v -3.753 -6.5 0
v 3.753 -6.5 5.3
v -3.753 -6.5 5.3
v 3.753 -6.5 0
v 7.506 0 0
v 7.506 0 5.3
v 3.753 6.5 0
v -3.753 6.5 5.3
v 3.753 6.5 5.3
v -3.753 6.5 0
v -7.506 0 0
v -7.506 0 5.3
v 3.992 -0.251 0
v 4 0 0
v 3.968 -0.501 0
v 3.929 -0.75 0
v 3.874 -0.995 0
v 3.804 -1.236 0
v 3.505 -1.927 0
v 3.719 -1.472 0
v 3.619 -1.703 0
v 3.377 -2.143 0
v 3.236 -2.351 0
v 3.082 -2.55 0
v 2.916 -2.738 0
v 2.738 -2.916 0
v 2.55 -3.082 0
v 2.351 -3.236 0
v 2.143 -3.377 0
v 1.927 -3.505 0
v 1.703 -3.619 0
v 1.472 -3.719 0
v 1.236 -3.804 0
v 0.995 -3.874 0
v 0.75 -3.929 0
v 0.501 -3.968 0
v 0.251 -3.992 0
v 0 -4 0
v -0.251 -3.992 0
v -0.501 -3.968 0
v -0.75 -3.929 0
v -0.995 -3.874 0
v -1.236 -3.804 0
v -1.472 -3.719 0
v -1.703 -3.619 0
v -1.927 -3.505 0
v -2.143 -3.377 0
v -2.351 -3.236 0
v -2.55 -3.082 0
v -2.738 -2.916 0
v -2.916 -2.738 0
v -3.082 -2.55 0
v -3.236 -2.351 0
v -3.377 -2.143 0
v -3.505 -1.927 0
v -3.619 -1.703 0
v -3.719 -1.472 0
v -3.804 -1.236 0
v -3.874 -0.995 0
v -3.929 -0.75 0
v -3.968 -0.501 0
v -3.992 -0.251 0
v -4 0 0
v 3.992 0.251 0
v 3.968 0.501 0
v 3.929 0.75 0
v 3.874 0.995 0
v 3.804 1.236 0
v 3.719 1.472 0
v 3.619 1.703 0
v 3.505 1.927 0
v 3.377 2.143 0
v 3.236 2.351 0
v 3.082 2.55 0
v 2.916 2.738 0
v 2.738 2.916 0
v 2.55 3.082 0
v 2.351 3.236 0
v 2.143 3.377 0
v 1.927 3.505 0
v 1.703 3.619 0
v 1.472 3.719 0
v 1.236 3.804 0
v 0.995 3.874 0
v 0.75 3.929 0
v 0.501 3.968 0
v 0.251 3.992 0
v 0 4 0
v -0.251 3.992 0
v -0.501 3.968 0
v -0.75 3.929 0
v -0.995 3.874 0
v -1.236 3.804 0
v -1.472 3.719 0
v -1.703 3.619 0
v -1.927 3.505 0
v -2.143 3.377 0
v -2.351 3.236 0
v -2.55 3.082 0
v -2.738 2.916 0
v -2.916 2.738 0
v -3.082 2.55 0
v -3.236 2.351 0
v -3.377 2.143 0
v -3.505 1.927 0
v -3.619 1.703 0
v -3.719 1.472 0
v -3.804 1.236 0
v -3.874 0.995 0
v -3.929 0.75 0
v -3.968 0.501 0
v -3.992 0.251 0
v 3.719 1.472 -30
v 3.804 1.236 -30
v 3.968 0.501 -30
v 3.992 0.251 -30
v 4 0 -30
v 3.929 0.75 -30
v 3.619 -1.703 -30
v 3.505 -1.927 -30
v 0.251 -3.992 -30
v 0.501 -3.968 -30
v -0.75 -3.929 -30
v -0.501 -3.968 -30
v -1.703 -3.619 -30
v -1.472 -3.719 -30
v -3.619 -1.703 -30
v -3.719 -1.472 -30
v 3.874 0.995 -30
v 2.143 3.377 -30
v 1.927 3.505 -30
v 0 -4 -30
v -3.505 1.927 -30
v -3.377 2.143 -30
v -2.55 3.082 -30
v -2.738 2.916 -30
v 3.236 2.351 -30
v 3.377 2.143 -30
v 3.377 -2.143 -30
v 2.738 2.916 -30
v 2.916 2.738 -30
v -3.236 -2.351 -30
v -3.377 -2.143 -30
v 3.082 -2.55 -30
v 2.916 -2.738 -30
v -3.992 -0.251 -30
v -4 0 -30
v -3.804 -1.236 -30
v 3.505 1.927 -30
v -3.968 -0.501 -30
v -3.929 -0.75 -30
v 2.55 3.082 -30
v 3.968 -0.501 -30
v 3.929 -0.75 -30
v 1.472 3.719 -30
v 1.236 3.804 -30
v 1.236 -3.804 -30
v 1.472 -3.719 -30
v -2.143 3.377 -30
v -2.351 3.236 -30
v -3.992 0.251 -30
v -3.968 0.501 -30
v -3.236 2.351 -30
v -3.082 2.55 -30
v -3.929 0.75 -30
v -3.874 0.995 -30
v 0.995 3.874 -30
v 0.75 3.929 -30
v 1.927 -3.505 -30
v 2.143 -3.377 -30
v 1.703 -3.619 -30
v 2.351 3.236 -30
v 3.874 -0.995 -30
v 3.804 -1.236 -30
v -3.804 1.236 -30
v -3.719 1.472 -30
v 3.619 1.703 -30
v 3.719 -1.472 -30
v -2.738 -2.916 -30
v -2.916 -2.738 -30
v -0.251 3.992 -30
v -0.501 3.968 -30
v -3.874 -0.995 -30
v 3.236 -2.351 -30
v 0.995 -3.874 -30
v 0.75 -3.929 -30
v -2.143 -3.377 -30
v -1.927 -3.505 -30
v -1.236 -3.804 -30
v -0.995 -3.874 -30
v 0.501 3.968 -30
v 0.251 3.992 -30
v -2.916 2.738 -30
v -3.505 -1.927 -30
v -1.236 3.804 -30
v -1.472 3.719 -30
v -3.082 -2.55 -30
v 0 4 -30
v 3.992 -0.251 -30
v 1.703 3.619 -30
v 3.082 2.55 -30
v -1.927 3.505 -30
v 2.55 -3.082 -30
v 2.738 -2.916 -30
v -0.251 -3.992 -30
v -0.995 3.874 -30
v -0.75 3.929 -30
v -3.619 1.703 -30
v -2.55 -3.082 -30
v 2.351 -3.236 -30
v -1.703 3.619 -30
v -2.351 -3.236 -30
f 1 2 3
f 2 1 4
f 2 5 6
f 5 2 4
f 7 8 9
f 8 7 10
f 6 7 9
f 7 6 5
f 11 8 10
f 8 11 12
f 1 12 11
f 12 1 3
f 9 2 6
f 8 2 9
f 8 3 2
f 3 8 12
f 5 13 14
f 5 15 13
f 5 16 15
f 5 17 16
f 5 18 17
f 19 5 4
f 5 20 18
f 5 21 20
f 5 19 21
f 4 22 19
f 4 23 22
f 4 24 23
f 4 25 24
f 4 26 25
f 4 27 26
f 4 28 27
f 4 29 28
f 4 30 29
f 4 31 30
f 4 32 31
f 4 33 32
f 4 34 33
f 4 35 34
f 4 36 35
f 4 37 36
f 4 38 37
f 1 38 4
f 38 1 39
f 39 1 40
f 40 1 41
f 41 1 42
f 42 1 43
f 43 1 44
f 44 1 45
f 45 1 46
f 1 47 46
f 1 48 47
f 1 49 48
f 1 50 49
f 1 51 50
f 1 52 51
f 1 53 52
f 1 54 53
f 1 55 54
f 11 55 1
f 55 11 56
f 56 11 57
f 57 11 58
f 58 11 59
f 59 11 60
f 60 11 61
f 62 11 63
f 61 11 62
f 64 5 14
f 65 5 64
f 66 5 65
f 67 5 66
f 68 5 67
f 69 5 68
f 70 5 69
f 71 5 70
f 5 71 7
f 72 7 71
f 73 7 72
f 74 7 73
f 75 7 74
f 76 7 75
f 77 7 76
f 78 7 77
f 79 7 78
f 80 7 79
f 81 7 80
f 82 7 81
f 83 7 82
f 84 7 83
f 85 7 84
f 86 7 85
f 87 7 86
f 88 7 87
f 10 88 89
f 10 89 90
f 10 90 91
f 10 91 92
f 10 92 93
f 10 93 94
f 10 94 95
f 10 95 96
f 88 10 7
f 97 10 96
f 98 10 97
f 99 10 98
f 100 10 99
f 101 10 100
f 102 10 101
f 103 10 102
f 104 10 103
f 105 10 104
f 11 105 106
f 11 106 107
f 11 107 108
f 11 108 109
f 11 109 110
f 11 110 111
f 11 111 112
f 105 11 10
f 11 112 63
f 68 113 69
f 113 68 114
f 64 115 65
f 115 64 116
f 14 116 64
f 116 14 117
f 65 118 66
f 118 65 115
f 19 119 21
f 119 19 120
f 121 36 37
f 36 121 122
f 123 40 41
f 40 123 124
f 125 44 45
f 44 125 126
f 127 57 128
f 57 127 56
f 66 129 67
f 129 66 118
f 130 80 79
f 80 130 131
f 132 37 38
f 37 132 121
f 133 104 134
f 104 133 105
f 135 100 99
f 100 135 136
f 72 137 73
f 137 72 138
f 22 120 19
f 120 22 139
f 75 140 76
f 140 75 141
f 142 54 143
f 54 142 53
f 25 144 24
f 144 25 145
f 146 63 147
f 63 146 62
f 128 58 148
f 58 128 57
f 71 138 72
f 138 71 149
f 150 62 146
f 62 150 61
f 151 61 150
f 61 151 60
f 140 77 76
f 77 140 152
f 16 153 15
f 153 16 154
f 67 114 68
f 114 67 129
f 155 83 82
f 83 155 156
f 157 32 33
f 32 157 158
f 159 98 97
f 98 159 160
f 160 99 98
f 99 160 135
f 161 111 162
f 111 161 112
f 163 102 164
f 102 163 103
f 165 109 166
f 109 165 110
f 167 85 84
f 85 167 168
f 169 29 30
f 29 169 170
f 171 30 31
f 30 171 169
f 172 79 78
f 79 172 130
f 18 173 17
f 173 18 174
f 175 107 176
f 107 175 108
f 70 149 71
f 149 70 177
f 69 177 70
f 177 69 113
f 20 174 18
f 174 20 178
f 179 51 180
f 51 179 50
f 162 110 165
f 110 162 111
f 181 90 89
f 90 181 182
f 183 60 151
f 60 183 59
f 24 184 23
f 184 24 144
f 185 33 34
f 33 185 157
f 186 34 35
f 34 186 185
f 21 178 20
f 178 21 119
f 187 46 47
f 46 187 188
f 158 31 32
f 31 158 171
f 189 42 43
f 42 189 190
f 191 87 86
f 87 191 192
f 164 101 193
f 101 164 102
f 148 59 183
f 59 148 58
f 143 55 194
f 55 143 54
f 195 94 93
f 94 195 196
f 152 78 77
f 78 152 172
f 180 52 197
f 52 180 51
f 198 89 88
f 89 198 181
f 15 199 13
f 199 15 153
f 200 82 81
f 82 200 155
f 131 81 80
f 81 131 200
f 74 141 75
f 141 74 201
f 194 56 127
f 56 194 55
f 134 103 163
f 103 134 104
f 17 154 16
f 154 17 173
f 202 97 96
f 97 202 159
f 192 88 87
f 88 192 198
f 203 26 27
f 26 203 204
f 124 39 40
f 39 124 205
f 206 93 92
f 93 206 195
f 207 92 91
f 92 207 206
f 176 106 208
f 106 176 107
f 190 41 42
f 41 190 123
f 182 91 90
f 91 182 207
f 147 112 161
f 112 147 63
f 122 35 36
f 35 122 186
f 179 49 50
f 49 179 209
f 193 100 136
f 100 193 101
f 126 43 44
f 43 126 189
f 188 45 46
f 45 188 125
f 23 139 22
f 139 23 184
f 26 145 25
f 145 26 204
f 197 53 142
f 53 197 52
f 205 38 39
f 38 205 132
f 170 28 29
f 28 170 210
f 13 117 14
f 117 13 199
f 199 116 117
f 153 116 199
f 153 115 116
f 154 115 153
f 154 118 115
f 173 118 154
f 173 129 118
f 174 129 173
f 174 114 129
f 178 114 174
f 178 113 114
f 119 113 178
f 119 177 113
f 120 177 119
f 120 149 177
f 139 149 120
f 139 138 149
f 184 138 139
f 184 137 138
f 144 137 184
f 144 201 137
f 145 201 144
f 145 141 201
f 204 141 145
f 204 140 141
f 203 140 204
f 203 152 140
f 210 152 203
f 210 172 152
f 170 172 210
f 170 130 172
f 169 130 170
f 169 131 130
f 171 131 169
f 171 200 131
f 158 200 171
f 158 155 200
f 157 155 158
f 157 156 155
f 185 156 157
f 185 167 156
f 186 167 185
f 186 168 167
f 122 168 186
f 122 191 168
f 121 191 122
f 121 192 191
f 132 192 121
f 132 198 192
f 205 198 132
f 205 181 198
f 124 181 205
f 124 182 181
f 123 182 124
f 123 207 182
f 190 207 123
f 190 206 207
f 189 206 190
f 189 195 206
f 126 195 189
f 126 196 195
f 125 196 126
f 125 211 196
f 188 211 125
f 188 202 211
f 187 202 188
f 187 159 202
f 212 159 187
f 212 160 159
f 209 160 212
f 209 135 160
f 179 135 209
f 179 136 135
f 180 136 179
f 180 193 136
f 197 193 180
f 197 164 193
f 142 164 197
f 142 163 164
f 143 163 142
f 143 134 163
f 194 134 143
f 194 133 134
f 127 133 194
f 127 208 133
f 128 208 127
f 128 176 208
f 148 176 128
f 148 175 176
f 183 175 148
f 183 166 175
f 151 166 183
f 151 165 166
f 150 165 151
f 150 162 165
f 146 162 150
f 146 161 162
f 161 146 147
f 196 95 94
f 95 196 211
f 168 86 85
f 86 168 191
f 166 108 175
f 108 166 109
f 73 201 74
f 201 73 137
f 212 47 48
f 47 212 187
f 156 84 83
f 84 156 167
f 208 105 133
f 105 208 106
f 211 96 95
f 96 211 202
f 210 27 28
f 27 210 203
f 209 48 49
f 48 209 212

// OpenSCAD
// M8 hex bolt (ISO 4014 style, simplified: unthreaded cylindrical shank)
// Head: hexagonal prism, across-flats 13 mm, height 5.3 mm
// Shank: diameter 8 mm, length 30 mm
// Axis: +Z. Head bottom face at z = 0, shank extends into z < 0.

$fn = 100;

// ---- Parameters ----------------------------------------------------
head_af     = 13;    // across-flats (対辺距離) [mm]
head_height = 5.3;   // 頭部高さ [mm]
shank_dia   = 8;     // シャンク直径 [mm]
shank_len   = 30;    // シャンク長さ [mm]

// ---- Modules -------------------------------------------------------
module hex_head(across_flats, h) {
    // circumscribed circle diameter from across-flats
    cylinder(h = h, d = across_flats / cos(30), $fn = 6);
}

module shank(d, l) {
    translate([0, 0, -l])
        cylinder(h = l, d = d);
}

module m8_hex_bolt() {
    union() {
        hex_head(head_af, head_height);
        shank(shank_dia, shank_len);
    }
}

// ---- Render --------------------------------------------------------
m8_hex_bolt();
